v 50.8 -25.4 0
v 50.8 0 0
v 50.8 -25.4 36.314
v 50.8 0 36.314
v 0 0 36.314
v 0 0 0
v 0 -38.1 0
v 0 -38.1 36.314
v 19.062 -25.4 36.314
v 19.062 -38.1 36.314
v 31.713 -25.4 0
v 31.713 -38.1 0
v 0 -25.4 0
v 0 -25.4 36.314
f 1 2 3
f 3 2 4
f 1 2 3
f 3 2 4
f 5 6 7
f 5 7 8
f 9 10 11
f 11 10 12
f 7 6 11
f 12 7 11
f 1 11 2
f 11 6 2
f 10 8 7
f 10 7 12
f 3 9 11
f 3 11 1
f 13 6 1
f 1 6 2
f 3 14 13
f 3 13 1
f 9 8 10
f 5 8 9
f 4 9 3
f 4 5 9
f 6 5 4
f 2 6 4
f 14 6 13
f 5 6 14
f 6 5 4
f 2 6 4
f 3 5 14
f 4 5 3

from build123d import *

# Parameters (mm, degrees)
F0_W     = 50.8
F0_H     = 36.3136812884
F1_DEPTH = 25.4
F2_DEPTH = 38.1
F4_DEPTH = 12.7


with BuildPart() as f1:
    # F0 (on Front) → F1 (new body)
    with BuildSketch(Plane.XZ):
        with Locations((25.4, 18.1568406442)):
            Rectangle(F0_W, F0_H)
    extrude(amount=F1_DEPTH)


with BuildPart() as f2:
    # F0 (on Front) → F2 (new body)
    with BuildSketch(Plane.XZ):
        with Locations((25.4, 18.1568406442)):
            Rectangle(F0_W, F0_H)
    extrude(amount=F2_DEPTH)

    # F3 (on face) → F4 (cut)
    with BuildSketch(Plane.XZ.offset(38.1)):
        Polygon((50.8, 36.3136812884), (19.0622135997, 36.3136812884), (31.7133627832, 0), (50.8, 0), align=None)
    extrude(amount=-F4_DEPTH, mode=Mode.SUBTRACT)


solid = Compound([f1.part, f2.part])
